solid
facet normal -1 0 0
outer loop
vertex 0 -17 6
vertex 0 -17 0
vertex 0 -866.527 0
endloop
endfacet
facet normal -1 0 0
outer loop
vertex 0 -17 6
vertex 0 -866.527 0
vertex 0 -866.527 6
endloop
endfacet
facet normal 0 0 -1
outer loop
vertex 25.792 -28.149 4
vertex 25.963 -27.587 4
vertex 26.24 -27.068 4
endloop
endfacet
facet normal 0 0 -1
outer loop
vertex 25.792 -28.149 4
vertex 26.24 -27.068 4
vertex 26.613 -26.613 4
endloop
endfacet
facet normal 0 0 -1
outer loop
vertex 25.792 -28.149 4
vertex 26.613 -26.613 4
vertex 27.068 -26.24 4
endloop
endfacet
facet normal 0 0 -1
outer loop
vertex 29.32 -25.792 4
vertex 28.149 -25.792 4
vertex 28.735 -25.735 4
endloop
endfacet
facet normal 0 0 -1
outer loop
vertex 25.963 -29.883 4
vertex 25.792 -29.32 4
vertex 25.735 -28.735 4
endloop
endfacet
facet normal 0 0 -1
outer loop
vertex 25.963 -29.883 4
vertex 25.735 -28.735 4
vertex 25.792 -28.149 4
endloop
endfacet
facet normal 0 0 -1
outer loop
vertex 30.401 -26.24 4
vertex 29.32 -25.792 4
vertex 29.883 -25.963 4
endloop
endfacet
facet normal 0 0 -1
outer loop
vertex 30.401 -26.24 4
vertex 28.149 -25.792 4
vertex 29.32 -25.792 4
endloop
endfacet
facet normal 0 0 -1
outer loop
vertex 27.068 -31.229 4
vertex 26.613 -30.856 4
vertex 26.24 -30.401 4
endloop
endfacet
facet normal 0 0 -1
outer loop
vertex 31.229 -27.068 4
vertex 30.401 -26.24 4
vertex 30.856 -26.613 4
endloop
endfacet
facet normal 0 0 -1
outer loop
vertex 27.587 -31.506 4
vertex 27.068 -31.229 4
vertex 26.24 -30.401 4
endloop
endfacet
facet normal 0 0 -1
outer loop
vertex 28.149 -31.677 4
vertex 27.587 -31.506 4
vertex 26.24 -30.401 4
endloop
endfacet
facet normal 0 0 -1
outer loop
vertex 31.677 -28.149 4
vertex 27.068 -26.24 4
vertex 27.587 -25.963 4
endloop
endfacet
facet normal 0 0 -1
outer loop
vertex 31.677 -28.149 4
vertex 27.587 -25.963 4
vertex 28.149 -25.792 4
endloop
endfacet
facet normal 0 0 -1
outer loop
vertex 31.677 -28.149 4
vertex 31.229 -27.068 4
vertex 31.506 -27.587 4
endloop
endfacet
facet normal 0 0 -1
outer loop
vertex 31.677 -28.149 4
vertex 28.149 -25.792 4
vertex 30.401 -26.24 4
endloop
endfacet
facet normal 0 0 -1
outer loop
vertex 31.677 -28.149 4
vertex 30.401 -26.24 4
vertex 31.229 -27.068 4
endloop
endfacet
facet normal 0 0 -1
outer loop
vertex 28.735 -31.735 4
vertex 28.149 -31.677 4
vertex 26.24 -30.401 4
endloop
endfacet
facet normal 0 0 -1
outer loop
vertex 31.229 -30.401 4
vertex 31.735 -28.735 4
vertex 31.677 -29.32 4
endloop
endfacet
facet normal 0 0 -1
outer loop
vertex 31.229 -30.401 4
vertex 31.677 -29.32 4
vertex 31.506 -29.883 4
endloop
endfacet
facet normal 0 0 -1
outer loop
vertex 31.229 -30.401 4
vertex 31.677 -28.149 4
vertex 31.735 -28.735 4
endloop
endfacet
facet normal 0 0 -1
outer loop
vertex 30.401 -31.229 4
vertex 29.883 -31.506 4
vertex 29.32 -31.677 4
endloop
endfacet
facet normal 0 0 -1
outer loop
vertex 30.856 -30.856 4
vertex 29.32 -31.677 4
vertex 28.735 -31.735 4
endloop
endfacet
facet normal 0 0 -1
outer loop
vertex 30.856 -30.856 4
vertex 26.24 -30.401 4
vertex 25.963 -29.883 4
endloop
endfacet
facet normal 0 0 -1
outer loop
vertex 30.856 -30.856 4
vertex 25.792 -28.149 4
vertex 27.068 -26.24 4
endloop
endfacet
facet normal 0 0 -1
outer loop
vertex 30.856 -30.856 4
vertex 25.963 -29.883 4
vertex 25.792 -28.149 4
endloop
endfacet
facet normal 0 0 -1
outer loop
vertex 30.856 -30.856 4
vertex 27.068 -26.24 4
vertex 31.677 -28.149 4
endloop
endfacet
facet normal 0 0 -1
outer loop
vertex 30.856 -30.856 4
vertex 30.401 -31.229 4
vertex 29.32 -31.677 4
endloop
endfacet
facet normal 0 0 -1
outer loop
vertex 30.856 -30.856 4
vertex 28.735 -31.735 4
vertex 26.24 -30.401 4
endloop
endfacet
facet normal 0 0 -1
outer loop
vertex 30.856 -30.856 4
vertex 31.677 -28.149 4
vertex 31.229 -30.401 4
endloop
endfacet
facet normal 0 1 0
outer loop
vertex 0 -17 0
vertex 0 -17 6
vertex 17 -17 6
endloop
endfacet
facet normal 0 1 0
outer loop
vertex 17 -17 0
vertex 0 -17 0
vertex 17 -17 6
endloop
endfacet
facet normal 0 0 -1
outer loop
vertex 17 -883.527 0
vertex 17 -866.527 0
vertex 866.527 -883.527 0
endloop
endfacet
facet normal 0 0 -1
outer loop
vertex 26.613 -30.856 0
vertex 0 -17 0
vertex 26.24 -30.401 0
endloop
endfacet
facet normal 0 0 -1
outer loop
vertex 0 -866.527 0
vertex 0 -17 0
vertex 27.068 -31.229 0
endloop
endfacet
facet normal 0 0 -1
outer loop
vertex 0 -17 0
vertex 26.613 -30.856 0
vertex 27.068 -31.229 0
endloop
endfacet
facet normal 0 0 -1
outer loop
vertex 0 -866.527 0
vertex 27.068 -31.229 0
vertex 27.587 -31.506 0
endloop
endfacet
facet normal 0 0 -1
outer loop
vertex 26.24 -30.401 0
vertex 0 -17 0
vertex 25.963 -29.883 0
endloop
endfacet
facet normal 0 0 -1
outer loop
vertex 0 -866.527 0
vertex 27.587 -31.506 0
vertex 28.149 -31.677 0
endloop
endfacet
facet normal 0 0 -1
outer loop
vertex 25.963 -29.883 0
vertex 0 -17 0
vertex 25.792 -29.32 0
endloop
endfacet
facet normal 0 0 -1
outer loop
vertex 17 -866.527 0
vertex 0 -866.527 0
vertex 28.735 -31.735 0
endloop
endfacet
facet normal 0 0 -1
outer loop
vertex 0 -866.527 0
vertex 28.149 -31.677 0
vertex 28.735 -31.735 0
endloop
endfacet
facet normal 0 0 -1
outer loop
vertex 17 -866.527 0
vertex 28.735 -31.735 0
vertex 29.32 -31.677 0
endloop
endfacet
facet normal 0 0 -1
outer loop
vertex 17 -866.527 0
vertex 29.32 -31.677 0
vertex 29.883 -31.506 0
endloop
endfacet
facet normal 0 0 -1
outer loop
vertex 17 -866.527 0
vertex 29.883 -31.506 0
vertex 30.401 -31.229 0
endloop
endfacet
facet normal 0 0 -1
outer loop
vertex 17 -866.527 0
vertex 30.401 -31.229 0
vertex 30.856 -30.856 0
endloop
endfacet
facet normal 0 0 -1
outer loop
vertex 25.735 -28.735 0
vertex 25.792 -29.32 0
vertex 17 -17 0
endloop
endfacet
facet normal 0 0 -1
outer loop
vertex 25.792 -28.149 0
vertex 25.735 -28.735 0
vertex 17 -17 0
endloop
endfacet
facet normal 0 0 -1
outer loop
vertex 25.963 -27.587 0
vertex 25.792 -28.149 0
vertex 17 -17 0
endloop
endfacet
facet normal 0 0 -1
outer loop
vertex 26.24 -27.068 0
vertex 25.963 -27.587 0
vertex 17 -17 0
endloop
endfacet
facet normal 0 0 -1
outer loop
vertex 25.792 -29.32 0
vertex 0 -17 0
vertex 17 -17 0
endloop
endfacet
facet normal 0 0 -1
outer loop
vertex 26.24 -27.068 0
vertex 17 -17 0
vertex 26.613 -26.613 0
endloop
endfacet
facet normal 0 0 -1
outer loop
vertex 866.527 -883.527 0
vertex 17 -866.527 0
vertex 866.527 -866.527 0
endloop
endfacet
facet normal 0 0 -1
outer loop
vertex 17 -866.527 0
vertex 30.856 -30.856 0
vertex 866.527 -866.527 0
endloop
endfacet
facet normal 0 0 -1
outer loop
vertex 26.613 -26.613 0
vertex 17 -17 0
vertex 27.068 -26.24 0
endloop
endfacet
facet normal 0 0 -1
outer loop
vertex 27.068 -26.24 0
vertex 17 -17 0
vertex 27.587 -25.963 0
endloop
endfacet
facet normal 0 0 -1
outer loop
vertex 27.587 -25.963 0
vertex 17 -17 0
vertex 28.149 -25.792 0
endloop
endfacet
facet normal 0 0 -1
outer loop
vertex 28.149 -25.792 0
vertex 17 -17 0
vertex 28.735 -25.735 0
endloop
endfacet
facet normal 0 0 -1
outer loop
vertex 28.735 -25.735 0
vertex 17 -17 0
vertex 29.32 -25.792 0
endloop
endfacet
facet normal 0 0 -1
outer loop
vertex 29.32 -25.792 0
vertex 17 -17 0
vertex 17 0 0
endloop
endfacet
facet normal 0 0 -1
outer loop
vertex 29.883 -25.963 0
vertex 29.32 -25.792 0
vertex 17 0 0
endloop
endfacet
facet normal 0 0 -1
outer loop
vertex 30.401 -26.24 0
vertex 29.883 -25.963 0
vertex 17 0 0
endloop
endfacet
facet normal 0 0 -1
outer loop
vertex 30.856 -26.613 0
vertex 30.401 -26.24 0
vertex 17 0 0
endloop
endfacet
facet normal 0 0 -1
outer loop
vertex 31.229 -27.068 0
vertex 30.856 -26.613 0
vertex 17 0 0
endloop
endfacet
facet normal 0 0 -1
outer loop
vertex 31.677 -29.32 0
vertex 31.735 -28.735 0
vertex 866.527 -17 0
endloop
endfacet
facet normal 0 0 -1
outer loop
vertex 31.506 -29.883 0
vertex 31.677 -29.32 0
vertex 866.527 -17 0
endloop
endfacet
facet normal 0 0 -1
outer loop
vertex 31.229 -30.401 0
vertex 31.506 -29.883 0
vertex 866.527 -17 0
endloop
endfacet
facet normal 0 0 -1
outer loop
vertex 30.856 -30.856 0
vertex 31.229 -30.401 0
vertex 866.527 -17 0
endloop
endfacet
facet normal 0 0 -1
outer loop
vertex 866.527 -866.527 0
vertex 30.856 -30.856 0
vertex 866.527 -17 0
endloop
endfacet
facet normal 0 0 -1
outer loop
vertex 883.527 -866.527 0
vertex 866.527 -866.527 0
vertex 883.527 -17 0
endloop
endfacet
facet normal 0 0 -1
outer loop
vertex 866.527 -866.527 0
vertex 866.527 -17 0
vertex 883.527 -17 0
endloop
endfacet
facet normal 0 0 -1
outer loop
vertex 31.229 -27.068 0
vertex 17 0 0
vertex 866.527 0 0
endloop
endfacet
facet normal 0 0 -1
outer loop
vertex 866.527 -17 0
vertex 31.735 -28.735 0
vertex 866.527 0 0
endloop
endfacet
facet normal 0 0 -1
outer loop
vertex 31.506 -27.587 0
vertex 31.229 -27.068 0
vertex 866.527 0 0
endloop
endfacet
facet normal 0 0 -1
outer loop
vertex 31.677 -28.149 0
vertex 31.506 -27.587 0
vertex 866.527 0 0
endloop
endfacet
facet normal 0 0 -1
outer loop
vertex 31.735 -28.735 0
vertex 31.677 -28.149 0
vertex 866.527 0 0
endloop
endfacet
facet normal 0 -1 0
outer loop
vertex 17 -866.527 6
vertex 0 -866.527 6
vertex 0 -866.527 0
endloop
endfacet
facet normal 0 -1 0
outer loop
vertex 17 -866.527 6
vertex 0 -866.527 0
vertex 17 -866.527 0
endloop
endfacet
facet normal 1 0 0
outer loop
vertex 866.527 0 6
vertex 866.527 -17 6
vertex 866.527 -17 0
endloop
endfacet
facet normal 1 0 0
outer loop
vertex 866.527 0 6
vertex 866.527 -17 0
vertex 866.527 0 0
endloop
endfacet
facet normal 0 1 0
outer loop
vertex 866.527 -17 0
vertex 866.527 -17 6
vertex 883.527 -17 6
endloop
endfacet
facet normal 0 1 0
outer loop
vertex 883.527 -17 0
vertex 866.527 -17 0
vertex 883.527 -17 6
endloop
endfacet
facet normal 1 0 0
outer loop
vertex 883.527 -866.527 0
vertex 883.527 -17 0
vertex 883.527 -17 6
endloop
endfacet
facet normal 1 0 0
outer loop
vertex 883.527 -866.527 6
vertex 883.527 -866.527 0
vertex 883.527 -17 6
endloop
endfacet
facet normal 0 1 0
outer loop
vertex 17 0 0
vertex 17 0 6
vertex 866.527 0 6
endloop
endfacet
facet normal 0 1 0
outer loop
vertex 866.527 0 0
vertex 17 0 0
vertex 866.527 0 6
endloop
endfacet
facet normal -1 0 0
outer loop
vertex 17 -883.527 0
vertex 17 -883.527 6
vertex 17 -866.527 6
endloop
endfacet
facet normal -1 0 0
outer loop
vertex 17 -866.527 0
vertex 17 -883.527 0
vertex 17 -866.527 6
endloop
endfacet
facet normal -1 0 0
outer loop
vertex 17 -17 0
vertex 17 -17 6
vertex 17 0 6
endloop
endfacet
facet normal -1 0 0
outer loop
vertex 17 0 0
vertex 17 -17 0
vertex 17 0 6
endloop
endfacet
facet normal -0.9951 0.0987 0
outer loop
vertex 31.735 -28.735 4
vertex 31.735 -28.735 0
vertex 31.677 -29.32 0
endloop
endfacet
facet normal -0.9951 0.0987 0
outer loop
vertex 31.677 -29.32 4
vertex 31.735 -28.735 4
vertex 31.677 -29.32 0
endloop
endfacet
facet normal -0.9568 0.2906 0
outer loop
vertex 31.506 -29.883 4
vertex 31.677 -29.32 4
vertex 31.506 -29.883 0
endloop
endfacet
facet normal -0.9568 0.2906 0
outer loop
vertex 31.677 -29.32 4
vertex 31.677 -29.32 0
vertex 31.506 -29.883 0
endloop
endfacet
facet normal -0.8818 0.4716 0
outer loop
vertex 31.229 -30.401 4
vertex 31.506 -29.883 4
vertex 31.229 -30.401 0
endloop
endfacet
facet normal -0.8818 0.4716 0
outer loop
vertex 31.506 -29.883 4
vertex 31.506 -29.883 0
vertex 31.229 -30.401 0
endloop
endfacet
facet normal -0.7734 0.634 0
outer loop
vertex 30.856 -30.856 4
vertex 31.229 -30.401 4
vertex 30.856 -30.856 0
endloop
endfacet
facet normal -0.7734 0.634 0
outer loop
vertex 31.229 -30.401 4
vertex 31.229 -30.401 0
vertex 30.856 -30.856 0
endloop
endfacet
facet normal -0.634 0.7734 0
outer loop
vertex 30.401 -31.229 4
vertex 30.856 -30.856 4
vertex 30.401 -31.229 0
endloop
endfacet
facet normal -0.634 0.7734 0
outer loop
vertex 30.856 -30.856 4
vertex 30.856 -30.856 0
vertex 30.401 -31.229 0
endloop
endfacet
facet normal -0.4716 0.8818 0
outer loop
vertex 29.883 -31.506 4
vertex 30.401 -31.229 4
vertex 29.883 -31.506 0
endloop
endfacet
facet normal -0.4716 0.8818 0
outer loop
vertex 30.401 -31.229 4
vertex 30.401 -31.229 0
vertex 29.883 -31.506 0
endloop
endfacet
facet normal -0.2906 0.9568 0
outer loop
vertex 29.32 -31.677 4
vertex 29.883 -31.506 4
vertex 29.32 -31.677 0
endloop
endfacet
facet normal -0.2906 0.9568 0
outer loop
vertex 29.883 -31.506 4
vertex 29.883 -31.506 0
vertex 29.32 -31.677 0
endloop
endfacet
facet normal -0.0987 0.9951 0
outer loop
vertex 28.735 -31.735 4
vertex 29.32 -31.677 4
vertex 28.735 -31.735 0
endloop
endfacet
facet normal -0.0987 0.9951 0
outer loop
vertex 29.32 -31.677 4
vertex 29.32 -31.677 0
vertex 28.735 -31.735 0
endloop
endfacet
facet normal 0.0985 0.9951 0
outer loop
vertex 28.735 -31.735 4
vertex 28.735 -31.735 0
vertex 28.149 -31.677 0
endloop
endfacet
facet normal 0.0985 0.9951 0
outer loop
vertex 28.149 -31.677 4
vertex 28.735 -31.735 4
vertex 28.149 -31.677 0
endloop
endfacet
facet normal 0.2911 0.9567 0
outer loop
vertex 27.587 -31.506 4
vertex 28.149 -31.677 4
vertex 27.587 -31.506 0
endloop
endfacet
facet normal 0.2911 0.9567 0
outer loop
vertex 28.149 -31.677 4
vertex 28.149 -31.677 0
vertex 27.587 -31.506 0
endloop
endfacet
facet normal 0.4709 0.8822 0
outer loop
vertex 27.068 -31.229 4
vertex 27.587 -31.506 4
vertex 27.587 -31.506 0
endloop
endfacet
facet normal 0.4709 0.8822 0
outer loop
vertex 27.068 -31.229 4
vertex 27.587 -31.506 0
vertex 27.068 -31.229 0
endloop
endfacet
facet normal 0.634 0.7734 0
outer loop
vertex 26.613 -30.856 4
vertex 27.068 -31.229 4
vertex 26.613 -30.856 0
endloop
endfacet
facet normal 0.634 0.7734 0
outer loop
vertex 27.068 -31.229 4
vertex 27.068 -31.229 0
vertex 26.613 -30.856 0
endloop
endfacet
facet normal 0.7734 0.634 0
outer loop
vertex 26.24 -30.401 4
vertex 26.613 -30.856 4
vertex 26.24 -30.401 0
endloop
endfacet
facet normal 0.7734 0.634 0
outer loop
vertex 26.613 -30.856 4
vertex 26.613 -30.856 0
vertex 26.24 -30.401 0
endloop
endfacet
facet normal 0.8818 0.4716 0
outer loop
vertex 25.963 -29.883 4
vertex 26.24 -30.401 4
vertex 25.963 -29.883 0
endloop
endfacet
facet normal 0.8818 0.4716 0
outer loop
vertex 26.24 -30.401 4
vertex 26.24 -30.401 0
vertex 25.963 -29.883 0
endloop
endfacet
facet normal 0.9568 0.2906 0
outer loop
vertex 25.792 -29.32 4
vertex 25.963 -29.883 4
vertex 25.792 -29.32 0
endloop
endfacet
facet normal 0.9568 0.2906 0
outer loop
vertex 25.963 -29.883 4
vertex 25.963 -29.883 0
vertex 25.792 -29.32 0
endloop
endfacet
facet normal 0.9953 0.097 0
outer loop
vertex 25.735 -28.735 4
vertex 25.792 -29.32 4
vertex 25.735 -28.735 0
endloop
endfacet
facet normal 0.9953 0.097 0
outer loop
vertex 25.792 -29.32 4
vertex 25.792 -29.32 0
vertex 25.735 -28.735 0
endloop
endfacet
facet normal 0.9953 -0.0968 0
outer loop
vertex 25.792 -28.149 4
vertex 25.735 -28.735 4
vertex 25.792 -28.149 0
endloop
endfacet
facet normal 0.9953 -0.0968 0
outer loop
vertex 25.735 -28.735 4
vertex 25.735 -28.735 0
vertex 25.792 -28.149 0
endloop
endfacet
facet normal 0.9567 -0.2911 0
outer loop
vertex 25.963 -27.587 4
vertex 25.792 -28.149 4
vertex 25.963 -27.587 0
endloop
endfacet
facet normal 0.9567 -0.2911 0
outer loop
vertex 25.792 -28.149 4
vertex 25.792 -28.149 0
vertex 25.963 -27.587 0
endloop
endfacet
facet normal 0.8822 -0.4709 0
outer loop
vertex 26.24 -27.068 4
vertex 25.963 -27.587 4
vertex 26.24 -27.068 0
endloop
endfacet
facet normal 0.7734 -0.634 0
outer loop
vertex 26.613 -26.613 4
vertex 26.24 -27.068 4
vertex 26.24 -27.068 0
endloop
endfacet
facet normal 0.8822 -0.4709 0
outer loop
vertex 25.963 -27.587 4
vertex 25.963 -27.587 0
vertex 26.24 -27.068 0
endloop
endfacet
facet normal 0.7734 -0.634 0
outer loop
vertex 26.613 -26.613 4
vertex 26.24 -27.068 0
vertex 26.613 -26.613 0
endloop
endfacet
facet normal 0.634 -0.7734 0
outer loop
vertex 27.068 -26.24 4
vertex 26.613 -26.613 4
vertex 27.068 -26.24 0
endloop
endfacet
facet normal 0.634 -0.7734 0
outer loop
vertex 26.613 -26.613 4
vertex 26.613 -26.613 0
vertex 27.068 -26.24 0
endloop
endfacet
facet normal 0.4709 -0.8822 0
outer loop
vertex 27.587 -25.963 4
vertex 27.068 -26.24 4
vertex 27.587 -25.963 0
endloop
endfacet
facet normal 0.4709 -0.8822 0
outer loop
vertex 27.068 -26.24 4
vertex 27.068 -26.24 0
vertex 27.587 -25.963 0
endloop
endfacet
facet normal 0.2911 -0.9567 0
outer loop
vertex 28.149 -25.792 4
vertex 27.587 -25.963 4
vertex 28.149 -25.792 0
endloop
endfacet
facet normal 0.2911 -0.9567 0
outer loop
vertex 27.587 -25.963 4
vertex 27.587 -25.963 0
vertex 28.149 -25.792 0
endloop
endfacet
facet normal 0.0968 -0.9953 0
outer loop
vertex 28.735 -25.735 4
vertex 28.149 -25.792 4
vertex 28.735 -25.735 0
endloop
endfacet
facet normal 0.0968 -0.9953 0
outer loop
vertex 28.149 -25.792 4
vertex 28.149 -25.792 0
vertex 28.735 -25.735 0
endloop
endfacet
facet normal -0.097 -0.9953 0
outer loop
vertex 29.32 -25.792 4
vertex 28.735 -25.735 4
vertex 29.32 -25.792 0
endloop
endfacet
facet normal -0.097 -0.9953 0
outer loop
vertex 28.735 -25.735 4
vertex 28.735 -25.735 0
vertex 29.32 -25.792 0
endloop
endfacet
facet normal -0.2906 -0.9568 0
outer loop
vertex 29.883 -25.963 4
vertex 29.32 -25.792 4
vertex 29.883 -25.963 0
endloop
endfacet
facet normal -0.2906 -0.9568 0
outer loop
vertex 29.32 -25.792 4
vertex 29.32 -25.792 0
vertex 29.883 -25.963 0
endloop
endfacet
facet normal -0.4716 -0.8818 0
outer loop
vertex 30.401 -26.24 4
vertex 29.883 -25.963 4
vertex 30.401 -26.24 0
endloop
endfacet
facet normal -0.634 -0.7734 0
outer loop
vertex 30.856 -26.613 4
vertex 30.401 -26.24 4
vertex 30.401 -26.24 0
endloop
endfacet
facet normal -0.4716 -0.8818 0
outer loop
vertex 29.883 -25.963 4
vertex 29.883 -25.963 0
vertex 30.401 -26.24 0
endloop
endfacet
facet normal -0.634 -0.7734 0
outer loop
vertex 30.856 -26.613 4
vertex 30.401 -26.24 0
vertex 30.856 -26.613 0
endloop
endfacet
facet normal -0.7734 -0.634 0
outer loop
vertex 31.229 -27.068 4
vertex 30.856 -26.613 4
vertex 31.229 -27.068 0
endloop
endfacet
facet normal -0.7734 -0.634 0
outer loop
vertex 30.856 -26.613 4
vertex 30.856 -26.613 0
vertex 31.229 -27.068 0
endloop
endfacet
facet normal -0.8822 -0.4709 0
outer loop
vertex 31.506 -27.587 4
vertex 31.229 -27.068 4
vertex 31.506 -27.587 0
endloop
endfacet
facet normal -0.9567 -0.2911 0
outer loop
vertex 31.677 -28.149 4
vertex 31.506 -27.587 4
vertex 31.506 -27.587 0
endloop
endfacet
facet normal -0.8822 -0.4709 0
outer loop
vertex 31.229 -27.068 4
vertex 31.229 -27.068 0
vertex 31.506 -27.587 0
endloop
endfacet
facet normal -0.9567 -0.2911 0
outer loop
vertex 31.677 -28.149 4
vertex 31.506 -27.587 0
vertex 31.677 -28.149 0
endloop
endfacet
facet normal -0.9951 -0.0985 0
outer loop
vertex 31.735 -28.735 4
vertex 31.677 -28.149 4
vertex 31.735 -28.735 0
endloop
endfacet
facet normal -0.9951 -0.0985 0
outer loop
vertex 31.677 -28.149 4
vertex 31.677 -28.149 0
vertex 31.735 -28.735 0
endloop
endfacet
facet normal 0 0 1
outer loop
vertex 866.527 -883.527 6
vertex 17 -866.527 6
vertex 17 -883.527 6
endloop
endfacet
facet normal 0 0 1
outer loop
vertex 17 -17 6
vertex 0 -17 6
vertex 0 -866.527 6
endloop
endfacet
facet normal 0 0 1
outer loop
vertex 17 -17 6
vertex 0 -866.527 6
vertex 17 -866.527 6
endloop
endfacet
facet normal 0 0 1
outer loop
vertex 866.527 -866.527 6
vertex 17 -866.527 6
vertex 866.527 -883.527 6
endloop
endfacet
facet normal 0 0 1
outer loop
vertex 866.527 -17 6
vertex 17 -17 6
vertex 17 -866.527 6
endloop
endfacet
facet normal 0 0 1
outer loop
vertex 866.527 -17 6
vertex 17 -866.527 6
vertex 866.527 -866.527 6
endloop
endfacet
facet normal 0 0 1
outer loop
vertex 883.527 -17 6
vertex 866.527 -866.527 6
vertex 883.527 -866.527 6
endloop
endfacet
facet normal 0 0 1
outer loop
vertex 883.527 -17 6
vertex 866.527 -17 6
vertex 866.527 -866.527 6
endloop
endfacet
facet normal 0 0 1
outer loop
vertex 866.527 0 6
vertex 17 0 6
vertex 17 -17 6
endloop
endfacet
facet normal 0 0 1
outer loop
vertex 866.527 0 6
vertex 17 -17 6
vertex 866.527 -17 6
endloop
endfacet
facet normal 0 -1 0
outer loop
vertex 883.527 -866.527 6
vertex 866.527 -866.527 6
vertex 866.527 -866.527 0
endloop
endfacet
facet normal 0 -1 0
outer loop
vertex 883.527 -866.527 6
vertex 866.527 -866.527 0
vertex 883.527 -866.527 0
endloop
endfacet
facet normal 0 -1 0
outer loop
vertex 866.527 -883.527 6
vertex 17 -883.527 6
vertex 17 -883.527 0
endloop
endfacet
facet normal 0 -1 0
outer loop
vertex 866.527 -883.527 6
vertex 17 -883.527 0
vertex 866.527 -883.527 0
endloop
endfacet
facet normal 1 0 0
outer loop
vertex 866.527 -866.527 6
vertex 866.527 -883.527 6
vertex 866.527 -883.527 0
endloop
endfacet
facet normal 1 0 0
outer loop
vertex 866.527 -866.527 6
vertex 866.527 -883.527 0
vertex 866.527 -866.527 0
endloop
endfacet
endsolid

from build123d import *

# Parameters (mm, degrees)
F0_W      = 883.52695
F0_H      = 6
F1_DEPTH  = 883.52695
F2_W      = 17
F2_H      = 17
F3_DEPTH  = 6
F4_W      = 17
F4_H      = 17
F5_DEPTH  = 6
F6_W      = 17
F6_H      = 17
F7_DEPTH  = 6
F8_W      = 17
F8_H      = 17
F9_DEPTH  = 6
F10_R     = 3
F11_DEPTH = 4


with BuildPart() as f1:
    # F0 (on Front) → F1 (new body)
    with BuildSketch(Plane.XZ):
        with Locations((441.763475, 3)):
            Rectangle(F0_W, F0_H)
    extrude(amount=F1_DEPTH)

    # F2 (on face) → F3 (cut)
    with BuildSketch(Plane.XY.offset(6)):
        with Locations((8.5, -8.5)):
            Rectangle(F2_W, F2_H)
    extrude(amount=-F3_DEPTH, mode=Mode.SUBTRACT)

    # F4 (on face) → F5 (cut)
    with BuildSketch(Plane.XY.offset(6)):
        with Locations((875.02695, -8.5)):
            Rectangle(F4_W, F4_H)
    extrude(amount=-F5_DEPTH, mode=Mode.SUBTRACT)

    # F6 (on face) → F7 (cut)
    with BuildSketch(Plane.XY.offset(6)):
        with Locations((875.02695, -875.02695)):
            Rectangle(F6_W, F6_H)
    extrude(amount=-F7_DEPTH, mode=Mode.SUBTRACT)

    # F8 (on face) → F9 (cut)
    with BuildSketch(Plane.XY.offset(6)):
        with Locations((8.5, -875.02695)):
            Rectangle(F8_W, F8_H)
    extrude(amount=-F9_DEPTH, mode=Mode.SUBTRACT)

    # F10 (on face) → F11 (cut)
    with BuildSketch(Plane(origin=(0, 0, 0), x_dir=(1, 0, 0), z_dir=(0, 0, -1))):
        with Locations((28.7346, 28.7346)):
            Circle(F10_R)
    extrude(amount=-F11_DEPTH, mode=Mode.SUBTRACT)


solid = f1.part
